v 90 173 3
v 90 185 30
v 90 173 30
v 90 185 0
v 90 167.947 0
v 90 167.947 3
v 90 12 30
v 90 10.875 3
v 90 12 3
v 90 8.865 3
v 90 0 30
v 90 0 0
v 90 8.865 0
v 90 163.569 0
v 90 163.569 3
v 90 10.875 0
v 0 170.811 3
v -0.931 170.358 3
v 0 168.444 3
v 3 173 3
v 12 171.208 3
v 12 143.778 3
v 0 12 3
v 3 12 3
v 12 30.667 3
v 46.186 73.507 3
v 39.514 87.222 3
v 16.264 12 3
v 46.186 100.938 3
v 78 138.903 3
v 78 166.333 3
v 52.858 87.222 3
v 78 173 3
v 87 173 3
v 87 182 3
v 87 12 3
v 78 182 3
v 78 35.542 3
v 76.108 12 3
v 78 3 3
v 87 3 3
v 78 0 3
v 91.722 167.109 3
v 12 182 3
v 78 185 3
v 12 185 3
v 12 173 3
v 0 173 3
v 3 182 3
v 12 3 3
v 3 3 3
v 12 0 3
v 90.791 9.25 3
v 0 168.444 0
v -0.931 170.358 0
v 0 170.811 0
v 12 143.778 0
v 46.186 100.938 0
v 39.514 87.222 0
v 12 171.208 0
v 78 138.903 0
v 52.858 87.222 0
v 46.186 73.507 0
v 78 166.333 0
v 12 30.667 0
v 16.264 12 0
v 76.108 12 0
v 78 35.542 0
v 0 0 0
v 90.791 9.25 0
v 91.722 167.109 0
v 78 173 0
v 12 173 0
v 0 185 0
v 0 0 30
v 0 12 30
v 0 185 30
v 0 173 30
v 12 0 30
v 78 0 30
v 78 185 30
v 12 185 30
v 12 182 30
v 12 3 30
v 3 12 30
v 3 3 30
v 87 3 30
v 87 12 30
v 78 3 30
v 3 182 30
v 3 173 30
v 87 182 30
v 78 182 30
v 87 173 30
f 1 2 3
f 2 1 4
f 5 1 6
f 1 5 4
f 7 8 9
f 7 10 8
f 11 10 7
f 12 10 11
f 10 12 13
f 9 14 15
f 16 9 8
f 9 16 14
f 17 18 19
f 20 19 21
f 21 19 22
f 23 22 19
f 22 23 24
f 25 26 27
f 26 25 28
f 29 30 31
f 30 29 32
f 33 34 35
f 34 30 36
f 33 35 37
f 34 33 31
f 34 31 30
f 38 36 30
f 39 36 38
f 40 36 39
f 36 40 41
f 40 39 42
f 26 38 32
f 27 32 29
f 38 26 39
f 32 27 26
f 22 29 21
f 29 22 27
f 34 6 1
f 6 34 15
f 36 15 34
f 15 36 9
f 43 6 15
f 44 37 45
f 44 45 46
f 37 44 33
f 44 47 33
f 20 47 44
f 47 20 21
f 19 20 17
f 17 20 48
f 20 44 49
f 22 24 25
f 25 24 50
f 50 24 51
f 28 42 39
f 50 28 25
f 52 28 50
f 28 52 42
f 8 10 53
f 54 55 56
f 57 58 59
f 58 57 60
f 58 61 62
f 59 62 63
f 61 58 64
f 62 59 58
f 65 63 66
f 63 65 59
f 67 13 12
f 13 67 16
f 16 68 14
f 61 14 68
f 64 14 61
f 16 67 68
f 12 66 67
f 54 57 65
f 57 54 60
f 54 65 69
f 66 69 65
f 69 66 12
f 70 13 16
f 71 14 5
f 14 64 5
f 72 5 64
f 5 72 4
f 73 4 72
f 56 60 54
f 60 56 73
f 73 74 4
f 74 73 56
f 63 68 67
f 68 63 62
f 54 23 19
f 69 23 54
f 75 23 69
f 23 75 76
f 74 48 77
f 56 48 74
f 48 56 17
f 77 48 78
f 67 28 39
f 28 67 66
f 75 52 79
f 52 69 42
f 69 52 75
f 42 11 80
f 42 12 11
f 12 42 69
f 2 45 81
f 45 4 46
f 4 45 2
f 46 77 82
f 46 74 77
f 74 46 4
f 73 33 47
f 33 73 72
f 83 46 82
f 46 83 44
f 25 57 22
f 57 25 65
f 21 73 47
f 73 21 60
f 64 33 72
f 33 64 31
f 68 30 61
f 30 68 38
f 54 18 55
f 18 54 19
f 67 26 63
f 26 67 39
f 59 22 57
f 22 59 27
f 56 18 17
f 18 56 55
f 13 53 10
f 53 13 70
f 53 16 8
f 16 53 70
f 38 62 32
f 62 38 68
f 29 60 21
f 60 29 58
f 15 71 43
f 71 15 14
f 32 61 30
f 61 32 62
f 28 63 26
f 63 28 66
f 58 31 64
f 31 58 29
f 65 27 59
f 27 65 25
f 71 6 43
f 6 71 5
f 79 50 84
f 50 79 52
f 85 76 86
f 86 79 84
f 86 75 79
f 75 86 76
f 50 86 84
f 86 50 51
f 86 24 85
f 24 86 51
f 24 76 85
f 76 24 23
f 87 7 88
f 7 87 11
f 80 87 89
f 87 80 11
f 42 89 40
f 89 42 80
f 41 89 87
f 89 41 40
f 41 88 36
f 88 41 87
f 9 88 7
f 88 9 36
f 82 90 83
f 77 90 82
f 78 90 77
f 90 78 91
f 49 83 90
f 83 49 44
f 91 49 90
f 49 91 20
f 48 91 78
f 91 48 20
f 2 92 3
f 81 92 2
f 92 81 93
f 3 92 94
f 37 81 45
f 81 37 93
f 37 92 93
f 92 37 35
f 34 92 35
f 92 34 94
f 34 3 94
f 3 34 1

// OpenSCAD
//Universal car stand for 1/10 touring car

plate = 3;
width = 90;
height = 30; 
length = 185;
b = 12;
a = atan(width/length);

leg = b;

%	cube([width,length,plate]);

union() {
	cube([width,b,plate]);

	translate([0,length-b,0])
	cube([width,b,plate]);

	translate([0,0,0])
	cube([b,length,plate]);
	translate([width-b,0,0])
	cube([b,length,plate]);

	
	translate([width-b/1.2,b/3,0])
	rotate([0,0,a])	
	cube([b,length,plate]);

	translate([0,b/2,0])
	rotate([0,0,-a])	
	cube([b,length,plate]);

// Legs

	translate([0,0,0])
	cube([leg,plate,height]);
	translate([0,0,0])
	cube([plate,leg,height]);

	translate([width-leg,0,0])
	cube([leg,plate,height]);
	translate([width-plate,0,0])
	cube([plate,leg,height]);

	translate([0,length-plate,0])
	cube([leg,plate,height]);
	translate([0,length-leg,0])
	cube([plate,leg,height]);

	translate([width-leg,length-plate,0])
	cube([leg,plate,height]);
	translate([width-plate,length-leg,0])
	cube([plate,leg,height]);
}
